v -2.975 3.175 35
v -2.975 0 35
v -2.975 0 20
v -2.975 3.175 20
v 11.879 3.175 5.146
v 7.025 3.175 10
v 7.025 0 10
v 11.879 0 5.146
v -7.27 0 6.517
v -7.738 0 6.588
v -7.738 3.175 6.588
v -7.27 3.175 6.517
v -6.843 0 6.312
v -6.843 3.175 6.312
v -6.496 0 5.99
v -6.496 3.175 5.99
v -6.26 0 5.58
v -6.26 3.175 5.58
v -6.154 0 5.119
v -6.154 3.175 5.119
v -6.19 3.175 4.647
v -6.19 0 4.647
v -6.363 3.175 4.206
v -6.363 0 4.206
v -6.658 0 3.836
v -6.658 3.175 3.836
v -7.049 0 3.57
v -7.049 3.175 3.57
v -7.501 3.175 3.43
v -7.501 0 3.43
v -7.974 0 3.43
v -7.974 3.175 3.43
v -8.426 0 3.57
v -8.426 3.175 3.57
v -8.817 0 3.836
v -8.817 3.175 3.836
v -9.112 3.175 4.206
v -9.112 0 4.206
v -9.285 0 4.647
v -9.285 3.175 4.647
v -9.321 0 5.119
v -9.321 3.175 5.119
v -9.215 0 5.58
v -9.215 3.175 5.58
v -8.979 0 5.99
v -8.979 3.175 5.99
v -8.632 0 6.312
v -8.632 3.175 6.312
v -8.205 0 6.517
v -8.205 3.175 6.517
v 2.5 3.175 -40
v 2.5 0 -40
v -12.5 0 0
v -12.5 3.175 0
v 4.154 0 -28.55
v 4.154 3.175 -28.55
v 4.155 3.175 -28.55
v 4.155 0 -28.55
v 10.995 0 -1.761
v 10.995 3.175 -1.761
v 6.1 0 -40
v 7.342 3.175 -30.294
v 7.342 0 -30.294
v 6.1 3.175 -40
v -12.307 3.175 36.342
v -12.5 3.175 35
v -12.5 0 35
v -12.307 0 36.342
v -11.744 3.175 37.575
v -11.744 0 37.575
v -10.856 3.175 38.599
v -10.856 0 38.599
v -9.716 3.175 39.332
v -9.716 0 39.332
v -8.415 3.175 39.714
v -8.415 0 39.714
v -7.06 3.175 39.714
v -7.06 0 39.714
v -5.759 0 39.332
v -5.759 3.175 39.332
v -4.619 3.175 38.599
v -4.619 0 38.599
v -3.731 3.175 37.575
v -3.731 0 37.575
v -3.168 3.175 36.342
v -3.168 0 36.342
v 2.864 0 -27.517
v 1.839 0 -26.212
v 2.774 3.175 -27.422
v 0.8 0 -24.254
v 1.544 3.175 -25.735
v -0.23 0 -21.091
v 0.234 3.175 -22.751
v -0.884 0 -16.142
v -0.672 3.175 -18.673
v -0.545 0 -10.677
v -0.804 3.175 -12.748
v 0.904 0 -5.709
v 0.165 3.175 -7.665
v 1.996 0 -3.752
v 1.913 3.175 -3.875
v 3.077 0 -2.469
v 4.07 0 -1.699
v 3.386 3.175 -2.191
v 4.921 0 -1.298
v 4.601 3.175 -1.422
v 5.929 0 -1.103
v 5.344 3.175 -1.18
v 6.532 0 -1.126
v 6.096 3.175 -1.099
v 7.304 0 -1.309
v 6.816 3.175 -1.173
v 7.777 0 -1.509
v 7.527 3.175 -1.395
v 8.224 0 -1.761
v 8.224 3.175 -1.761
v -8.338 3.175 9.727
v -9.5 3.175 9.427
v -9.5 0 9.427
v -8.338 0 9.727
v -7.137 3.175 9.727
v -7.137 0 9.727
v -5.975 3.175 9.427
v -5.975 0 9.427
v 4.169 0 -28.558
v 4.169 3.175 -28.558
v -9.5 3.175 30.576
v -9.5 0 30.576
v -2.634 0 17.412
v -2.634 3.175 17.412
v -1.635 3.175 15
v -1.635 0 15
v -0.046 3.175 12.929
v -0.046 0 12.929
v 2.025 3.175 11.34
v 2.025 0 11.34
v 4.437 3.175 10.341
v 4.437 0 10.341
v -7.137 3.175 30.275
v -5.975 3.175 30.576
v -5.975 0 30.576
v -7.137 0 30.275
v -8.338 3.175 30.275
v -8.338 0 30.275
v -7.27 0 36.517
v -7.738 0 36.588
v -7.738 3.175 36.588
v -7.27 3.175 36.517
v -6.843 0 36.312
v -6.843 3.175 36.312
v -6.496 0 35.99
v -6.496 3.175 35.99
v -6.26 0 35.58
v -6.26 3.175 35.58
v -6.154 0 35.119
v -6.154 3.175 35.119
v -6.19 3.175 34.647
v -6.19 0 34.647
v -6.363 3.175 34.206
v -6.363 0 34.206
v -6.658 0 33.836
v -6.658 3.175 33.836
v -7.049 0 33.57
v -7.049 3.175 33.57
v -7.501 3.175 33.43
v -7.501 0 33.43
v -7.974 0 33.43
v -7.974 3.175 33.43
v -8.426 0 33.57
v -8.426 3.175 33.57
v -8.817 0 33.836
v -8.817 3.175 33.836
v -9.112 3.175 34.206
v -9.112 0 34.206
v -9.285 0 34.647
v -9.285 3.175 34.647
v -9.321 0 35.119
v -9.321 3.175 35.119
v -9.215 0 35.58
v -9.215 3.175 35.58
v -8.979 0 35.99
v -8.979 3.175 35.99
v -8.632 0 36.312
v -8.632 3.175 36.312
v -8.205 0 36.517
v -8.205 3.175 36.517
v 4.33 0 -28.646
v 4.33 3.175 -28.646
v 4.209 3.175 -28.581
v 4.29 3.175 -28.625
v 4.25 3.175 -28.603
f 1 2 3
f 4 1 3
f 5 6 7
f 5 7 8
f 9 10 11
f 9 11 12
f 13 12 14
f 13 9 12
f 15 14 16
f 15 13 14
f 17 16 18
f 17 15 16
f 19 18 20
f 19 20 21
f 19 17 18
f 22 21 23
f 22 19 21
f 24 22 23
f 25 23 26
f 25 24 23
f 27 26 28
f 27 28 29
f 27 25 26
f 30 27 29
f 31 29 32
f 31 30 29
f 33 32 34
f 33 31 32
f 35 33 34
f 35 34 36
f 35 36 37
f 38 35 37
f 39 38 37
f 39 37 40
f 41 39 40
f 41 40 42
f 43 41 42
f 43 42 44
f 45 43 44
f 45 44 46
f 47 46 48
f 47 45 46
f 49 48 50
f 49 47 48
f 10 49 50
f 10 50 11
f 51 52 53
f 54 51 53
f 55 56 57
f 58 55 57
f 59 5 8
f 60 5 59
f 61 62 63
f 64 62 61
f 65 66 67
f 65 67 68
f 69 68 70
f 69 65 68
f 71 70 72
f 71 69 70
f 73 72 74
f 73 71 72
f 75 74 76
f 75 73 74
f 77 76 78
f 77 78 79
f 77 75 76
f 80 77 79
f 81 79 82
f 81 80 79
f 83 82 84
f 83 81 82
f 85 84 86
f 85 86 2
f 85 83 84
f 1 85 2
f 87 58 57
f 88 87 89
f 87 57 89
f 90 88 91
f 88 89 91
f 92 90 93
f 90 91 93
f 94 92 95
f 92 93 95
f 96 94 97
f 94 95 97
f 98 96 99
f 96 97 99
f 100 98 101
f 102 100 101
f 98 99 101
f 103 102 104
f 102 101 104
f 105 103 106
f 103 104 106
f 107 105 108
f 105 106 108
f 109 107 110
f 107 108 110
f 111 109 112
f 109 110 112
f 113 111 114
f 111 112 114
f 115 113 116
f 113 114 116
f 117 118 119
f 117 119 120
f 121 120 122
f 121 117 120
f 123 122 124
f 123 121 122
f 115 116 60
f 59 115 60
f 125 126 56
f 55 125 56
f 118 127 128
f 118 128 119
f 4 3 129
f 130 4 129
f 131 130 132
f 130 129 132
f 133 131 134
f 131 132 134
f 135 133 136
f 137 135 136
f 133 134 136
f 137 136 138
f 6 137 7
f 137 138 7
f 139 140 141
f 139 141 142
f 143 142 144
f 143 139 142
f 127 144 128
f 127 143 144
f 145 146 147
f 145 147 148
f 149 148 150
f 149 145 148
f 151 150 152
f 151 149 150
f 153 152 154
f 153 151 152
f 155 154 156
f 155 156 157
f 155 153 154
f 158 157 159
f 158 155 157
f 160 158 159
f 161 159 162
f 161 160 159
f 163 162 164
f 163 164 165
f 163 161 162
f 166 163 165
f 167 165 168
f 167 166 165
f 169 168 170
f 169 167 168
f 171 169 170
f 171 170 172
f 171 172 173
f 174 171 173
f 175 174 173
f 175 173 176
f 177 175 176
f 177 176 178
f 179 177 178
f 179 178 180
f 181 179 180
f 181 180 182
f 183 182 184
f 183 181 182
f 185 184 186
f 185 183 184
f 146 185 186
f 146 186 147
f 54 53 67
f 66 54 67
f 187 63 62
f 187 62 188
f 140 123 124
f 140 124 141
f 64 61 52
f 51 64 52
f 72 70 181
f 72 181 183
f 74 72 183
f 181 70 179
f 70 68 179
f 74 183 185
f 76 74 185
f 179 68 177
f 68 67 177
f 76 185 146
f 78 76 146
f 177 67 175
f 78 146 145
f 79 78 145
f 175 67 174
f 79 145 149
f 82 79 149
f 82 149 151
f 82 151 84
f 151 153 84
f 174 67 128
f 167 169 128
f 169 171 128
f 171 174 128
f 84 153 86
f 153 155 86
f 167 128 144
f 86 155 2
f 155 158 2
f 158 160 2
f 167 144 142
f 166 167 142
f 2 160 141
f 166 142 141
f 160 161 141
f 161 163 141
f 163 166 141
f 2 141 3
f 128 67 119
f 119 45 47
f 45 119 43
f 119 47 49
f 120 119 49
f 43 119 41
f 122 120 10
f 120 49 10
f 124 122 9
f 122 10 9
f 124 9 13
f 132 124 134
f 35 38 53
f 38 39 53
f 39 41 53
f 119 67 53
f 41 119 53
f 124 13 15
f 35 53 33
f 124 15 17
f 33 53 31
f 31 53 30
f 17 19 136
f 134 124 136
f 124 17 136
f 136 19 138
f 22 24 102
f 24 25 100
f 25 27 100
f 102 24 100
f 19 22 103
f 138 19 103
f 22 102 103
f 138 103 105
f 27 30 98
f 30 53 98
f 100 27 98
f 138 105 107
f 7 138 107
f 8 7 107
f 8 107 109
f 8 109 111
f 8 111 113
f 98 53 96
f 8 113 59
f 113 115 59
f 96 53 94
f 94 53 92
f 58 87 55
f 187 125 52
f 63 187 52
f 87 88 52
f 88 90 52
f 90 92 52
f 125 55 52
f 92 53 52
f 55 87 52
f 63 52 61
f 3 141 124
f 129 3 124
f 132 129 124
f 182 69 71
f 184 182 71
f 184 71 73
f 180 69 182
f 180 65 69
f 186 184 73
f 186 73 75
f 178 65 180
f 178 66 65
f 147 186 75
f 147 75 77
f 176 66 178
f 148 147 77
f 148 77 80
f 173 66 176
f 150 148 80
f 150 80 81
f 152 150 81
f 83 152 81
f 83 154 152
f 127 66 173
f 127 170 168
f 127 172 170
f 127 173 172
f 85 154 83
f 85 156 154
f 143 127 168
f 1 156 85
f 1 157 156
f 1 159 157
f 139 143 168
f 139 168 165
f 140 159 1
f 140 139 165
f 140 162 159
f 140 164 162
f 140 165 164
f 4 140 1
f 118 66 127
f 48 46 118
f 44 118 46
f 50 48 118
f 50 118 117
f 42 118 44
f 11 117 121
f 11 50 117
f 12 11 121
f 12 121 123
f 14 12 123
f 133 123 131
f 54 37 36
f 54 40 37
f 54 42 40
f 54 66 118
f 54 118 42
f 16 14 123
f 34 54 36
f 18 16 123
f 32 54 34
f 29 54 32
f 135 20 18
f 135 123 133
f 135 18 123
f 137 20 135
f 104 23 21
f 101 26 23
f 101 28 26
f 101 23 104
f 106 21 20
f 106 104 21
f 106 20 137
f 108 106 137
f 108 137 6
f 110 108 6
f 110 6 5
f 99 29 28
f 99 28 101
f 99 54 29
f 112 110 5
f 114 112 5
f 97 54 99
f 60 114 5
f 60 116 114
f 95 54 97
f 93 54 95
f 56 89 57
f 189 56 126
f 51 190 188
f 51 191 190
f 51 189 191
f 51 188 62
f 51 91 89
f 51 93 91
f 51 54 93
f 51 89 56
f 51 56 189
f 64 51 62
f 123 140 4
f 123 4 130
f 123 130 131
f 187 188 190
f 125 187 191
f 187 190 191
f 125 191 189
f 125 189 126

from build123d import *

# Parameters (mm, degrees)
CROQUIS1_R              = 1.5875
SALIENTE_EXTRUIR1_DEPTH = 3.175
CORTAR_EXTRUIR1_DEPTH   = 3.175
CORTAR_EXTRUIR3_DEPTH   = 10
CROQUIS5_R              = 10
CORTAR_EXTRUIR8_DEPTH   = 10
REDONDEO2_R             = 2
ESQUISSE1_RX            = 14
ESQUISSE1_RY            = 7
ENL_V_MAT_EXTRU_1_DEPTH = 43.027736377
ESQUISSE2_W             = 6.812613354
ESQUISSE2_H             = 3.3
ENL_V_MAT_EXTRU_2_DEPTH = 43.027736555


with BuildPart() as part:
    # Croquis1 → Saliente-Extruir1 (new body)
    with BuildSketch(Plane(origin=(0, 0, 0), x_dir=(1, 0, 0), z_dir=(0, 1, 0))):
        with BuildLine():
            Line((-12.5, 0), (-12.5, -40))
            Line((-12.5, -40), (-2.975, -40))
            Line((-2.975, -40), (-2.975, -20))
            ThreePointArc((-2.975, -20), (-0.046067812, -12.928932188), (7.025, -10))
            Line((7.025, -10), (12.5, -10))
            Line((12.5, -10), (12.5, 40))
            Line((12.5, 40), (2.5, 40))
            Line((2.5, 40), (-12.5, 0))
        make_face()
        with Locations(Location((-7.7375, -5, 0), (0, 0, 270))):
            Circle(CROQUIS1_R, mode=Mode.SUBTRACT)
        with Locations(Location((-7.7375, -35, 0), (0, 0, 270))):
            Circle(CROQUIS1_R, mode=Mode.SUBTRACT)
    extrude(amount=SALIENTE_EXTRUIR1_DEPTH)

    # Croquis2 → Cortar-Extruir1 (cut)
    with BuildSketch(Plane(origin=(0, 3.175, 0), x_dir=(1, 0, 0), z_dir=(0, 1, 0))):
        Polygon((12.5, -10), (6.1, 40), (12.5, 40), align=None)
    extrude(amount=-CORTAR_EXTRUIR1_DEPTH, mode=Mode.SUBTRACT)

    # Croquis3 → Cortar-Extruir3 (cut)
    with BuildSketch(Plane(origin=(0, 3.175, 0), x_dir=(1, 0, 0), z_dir=(0, 1, 0))):
        with BuildLine():
            ThreePointArc((-5.975, -30.575635639), (-7.7375, -30.2375), (-9.5, -30.575635639))
            Line((-9.5, -30.575635639), (-9.5, -9.427055314))
            ThreePointArc((-9.5, -9.427055314), (-7.7375, -9.765), (-5.975, -9.427055314))
            Line((-5.975, -9.427055314), (-5.975, -14.803847577))
            Line((-5.975, -14.803847577), (-5.975, -30.575635639))
        make_face()
        with BuildLine():
            ThreePointArc((-12.5, -35), (-7.7375, -39.7625), (-2.975, -35))
            Line((-2.975, -35), (-2.975, -40))
            Line((-2.975, -40), (-12.5, -40))
            Line((-12.5, -40), (-12.5, -35))
        make_face()
    extrude(amount=-CORTAR_EXTRUIR3_DEPTH, mode=Mode.SUBTRACT)

    # Croquis5 → Cortar-Extruir8 (cut)
    with BuildSketch(Plane(origin=(0, 3.175, 0), x_dir=(1, 0, 0), z_dir=(0, 1, 0))):
        with Locations((9.3, 15)):
            Circle(CROQUIS5_R)
        Polygon((7.025, -10), (11.878723404, -5.146276596), (12.5, -10), align=None)
    extrude(amount=-CORTAR_EXTRUIR8_DEPTH, mode=Mode.SUBTRACT)

    # Redondeo2
    redondeo2_edges = [part.edges().sort_by_distance(p)[0] for p in [
        (8.030358645, 1.5875, -24.919073083),
        (10.569641355, 1.5875, -5.080926917),
    ]]
    fillet(redondeo2_edges, radius=REDONDEO2_R)

    # Esquisse1 → Enlèv. mat.-Extru.1 (cut, through all)
    with BuildSketch(Plane(origin=(0, 3.175, 0), x_dir=(1, 0, 0), z_dir=(0, 1, 0))):
        with Locations(Location((6.096336345, 15.099252248), (0, 0, -90))):
            Ellipse(ESQUISSE1_RX, ESQUISSE1_RY)
    extrude(amount=-ENL_V_MAT_EXTRU_1_DEPTH, mode=Mode.SUBTRACT)

    # Esquisse2 → Enlèv. mat.-Extru.2 (cut, through all)
    with BuildSketch(Plane(origin=(0, 3.175, 0), x_dir=(1, 0, 0), z_dir=(0, 1, 0))):
        with Locations((11.483320122, 3.411473453)):
            Rectangle(ESQUISSE2_W, ESQUISSE2_H)
    extrude(amount=-ENL_V_MAT_EXTRU_2_DEPTH, mode=Mode.SUBTRACT)

    # Chanfrein1
    # the kernel refuses this chamfer: 5, 3.65932295 mm, written as the material it takes off along each edge
    with BuildSketch(Plane(origin=(7.533468678, -8.470907308, -28.801025952), x_dir=(-0.009849351174311172, 0, -0.9999514939643048), z_dir=(0, 1, 0))) as chanfrein1_piece_1:
        with BuildLine():
            Line((1.589139403, 0), (-0.217570658, 3.381370478))
            Line((-0.217570658, 3.381370478), (-0.306685884, 3.336000041))
            ThreePointArc((-0.306685884, 3.336000041), (0.203744233, 1.713157434), (-0.091827617, 0.03959405))
            Line((-0.091827617, 0.03959405), (0.011718833, -0.099310971))
            ThreePointArc((0.011718833, -0.099310971), (0.795376625, -0.006838256), (1.600858236, -0.099310971))
            Line((1.600858236, -0.099310971), (1.589139403, 0))
        make_face()
    extrude(amount=20.116814349, mode=Mode.SUBTRACT)


solid = part.part
